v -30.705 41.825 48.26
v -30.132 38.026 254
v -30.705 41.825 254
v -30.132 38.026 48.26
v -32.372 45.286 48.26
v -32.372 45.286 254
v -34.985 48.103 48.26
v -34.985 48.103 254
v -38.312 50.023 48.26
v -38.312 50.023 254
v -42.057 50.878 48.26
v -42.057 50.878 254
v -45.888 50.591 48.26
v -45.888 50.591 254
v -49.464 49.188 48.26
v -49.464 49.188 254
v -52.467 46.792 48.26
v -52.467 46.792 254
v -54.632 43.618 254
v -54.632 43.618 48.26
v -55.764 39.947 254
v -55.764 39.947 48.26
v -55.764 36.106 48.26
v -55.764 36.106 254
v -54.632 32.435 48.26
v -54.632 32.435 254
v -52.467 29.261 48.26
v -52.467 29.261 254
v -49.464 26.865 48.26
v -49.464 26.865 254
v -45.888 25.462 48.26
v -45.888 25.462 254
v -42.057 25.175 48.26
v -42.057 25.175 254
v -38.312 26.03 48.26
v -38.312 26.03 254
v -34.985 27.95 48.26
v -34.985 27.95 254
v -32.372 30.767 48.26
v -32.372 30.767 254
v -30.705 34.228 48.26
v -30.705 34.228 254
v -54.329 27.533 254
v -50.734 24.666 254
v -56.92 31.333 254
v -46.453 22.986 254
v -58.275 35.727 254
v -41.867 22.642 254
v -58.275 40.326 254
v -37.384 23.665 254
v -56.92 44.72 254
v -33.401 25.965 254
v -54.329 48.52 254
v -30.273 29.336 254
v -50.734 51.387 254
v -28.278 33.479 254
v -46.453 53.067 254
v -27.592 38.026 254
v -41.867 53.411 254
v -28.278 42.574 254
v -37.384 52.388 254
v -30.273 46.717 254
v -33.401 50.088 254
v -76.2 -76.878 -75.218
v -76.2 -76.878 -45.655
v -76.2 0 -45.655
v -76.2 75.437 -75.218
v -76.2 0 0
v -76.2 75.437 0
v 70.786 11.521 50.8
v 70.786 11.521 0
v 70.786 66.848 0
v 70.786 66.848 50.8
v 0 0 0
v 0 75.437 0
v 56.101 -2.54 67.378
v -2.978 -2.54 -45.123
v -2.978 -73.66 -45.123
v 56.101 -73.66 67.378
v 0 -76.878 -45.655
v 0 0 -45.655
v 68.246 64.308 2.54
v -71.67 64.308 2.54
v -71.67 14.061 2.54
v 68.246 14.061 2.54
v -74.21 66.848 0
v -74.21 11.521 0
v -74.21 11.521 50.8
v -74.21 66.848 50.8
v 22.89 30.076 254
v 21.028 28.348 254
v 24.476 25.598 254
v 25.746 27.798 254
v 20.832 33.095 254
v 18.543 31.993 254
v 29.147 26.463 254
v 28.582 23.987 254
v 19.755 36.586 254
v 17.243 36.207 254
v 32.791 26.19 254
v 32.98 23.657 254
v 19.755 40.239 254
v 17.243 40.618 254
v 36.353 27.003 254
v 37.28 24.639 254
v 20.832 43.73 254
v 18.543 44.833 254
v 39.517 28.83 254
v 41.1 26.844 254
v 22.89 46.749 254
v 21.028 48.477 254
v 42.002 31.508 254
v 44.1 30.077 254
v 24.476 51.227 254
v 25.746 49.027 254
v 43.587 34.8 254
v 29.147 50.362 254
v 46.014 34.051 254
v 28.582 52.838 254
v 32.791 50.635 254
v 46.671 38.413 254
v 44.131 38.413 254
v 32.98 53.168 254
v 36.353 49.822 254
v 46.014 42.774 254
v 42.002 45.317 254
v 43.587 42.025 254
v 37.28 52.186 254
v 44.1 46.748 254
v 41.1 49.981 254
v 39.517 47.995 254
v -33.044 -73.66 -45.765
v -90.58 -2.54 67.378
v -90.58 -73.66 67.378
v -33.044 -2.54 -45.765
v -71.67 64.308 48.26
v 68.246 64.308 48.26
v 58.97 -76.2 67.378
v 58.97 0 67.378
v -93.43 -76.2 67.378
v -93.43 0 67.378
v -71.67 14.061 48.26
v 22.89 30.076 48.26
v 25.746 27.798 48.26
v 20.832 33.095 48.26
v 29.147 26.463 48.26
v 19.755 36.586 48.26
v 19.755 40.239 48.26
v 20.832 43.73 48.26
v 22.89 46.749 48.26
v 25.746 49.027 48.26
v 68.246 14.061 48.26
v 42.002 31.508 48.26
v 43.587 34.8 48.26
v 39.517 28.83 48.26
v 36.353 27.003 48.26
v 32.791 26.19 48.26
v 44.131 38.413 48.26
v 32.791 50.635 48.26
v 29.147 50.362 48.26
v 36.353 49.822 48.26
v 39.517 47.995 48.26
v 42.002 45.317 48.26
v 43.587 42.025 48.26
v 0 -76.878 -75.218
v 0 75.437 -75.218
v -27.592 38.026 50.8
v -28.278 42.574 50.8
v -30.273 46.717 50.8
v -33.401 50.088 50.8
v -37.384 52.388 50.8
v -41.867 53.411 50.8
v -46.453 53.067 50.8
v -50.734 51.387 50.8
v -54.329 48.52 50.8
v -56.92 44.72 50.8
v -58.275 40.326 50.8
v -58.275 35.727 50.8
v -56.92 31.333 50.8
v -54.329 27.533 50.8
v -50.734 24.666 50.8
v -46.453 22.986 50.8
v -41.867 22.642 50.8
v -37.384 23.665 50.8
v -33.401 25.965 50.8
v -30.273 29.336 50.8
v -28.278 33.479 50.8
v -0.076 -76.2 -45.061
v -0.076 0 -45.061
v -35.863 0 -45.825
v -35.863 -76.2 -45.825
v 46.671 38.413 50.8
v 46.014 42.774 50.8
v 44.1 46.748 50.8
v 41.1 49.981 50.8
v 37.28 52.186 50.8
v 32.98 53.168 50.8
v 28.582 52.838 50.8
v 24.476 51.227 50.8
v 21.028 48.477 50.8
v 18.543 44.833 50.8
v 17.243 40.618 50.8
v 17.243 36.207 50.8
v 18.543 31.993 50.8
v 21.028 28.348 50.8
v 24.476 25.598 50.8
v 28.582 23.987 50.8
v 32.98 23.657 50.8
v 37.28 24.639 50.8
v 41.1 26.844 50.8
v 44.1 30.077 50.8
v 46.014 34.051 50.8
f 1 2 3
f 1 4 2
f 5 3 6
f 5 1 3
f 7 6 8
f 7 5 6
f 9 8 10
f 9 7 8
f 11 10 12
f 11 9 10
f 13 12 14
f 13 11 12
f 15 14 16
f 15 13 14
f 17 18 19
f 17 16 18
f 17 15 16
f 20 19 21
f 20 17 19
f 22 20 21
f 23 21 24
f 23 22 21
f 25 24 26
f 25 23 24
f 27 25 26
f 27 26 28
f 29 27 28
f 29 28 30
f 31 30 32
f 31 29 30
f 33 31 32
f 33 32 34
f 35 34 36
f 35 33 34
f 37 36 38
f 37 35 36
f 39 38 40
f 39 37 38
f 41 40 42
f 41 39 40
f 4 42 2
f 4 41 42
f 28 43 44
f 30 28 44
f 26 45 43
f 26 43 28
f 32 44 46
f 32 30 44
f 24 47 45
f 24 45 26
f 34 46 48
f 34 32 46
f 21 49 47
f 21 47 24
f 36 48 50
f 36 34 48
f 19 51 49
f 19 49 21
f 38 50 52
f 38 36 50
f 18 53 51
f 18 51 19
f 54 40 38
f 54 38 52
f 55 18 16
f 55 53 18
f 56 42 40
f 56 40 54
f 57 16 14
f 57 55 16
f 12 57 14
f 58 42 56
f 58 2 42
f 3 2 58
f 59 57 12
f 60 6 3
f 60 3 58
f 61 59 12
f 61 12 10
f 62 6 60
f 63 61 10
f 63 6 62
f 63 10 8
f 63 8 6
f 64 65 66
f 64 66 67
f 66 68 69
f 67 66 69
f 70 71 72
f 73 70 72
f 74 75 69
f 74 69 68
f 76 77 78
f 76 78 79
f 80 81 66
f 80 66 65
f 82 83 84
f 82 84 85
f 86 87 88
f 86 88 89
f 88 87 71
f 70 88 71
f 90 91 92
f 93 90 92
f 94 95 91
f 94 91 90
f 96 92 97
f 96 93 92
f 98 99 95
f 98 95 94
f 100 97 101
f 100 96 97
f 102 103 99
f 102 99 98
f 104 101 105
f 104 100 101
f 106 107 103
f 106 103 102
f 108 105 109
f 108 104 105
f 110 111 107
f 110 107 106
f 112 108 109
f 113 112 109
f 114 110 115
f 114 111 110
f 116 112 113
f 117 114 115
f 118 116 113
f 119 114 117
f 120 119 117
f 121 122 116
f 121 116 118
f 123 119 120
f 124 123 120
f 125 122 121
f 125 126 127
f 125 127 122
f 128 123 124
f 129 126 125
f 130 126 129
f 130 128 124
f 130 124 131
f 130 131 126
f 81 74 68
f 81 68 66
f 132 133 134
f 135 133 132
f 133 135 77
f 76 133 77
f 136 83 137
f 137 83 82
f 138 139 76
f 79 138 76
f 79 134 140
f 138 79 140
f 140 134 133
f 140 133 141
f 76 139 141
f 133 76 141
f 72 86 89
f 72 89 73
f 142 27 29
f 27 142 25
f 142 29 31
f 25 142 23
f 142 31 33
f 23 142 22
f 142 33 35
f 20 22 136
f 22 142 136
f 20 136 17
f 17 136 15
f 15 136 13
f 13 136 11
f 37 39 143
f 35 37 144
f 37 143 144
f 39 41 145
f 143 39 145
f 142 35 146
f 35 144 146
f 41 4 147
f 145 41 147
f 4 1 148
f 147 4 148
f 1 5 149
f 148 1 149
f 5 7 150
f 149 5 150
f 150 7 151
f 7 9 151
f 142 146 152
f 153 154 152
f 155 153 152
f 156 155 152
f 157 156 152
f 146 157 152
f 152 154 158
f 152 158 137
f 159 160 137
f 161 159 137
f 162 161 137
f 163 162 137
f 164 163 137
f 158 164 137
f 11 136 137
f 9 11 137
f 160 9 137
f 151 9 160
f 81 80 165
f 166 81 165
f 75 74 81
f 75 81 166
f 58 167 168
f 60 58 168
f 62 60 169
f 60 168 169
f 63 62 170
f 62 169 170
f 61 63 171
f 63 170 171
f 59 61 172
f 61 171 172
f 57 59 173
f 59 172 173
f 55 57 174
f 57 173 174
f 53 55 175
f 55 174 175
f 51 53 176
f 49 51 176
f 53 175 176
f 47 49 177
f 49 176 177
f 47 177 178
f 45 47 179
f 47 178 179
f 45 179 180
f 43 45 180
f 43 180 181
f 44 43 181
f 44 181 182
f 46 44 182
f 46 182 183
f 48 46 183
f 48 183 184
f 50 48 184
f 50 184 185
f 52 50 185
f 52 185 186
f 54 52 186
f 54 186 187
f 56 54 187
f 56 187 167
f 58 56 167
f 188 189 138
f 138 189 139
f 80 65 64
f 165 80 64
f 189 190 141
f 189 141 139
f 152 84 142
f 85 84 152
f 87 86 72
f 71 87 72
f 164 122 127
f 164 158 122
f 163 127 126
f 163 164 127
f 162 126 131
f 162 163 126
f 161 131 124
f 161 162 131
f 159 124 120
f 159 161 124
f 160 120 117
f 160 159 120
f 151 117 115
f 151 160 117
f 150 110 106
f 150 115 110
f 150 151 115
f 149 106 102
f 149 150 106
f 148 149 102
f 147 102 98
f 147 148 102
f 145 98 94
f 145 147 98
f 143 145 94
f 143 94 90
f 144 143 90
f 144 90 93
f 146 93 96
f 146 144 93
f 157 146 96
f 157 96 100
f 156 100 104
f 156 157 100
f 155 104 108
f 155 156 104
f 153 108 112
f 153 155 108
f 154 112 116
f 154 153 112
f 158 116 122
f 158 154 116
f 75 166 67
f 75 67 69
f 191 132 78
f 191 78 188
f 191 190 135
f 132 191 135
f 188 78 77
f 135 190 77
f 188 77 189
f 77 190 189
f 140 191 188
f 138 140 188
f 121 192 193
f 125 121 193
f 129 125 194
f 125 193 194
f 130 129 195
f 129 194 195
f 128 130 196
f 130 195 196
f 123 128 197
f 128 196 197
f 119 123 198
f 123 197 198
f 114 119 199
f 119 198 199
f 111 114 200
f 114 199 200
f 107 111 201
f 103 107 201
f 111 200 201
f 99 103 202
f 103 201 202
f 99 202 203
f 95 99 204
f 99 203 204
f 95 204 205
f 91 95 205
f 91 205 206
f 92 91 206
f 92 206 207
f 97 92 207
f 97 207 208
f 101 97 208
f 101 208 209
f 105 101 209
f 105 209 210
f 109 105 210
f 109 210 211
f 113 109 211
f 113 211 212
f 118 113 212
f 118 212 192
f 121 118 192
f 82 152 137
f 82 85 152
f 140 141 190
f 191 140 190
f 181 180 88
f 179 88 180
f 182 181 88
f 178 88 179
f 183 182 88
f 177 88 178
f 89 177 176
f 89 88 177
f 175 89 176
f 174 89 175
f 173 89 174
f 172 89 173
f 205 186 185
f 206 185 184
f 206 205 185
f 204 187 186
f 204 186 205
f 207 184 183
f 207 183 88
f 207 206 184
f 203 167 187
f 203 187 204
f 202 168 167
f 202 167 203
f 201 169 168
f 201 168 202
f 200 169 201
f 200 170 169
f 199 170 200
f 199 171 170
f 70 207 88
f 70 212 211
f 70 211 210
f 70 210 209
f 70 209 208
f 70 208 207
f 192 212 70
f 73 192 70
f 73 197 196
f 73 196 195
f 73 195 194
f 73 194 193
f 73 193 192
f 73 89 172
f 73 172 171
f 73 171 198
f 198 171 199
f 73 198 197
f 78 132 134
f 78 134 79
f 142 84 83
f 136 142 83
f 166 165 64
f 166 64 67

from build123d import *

# Parameters (mm, degrees)
F1_DEPTH = 76.2
F2_T     = -2.54
F3_W     = 144.9953940939
F3_H     = 55.3271894277
F3_R     = 12.7
F4_DEPTH = 50.8
F5_R     = 14.7965587388
F5_R_2   = 15.4277333538
F6_DEPTH = 254
F8_DEPTH = 76.2
F9_T     = -2.54


with BuildPart() as f1:
    # F0 (on Front) → F1 (new body)
    with BuildSketch(Plane.XZ):
        Polygon((58.970191346, 67.3783349957), (-93.429808654, 67.3783349957), (-35.8631499112, -45.8253743127), (-0.0760250571, -45.0607344085), align=None)
    extrude(amount=F1_DEPTH)

    # F2
    f2_openings = [f1.faces().sort_by_distance(p)[0] for p in [
        (-17.229809, -38.1, 67.378335),
        (-17.969587, -38.1, -45.443054),
    ]]
    offset(amount=F2_T, openings=f2_openings)


with BuildPart() as f4:
    # F3 (on Top) → F4 (new body)
    with BuildSketch(Plane.XY):
        with Locations((-1.7121303827, 39.1846336424)):
            Rectangle(F3_W, F3_H)
        with Locations((-41.7766466267, 38.7076750335)):
            Circle(F3_R, mode=Mode.SUBTRACT)
        with Locations((32.1519262469, 37.2767992068)):
            Circle(F3_R, mode=Mode.SUBTRACT)
    extrude(amount=F4_DEPTH)

    # F5 (on Top) → F6 (join)
    with BuildSketch(Plane.XY):
        with Locations((31.8746976554, 38.4125187993)):
            Circle(F5_R)
        with Locations((-43.0200658739, 38.0264669657)):
            Circle(F5_R_2)
    extrude(amount=F6_DEPTH)

    # F9
    f9_openings = [f4.faces().sort_by_distance(p)[0] for p in [
        (31.874698, 38.412519, 254),
        (-43.020066, 38.026467, 254),
    ]]
    offset(amount=F9_T, openings=f9_openings, kind=Kind.INTERSECTION)


with BuildPart() as f8:
    # F7 (on Right) → F8 (new body)
    with BuildSketch(Plane.YZ):
        Polygon((75.4367336631, 0), (0, 0), (0, -45.6552617252), (-76.8776759505, -45.6552617252), (-76.8776759505, -75.2183869481), (75.4367336631, -75.2183869481), align=None)
    extrude(amount=-F8_DEPTH)


solid = Compound([f1.part, f4.part, f8.part])
